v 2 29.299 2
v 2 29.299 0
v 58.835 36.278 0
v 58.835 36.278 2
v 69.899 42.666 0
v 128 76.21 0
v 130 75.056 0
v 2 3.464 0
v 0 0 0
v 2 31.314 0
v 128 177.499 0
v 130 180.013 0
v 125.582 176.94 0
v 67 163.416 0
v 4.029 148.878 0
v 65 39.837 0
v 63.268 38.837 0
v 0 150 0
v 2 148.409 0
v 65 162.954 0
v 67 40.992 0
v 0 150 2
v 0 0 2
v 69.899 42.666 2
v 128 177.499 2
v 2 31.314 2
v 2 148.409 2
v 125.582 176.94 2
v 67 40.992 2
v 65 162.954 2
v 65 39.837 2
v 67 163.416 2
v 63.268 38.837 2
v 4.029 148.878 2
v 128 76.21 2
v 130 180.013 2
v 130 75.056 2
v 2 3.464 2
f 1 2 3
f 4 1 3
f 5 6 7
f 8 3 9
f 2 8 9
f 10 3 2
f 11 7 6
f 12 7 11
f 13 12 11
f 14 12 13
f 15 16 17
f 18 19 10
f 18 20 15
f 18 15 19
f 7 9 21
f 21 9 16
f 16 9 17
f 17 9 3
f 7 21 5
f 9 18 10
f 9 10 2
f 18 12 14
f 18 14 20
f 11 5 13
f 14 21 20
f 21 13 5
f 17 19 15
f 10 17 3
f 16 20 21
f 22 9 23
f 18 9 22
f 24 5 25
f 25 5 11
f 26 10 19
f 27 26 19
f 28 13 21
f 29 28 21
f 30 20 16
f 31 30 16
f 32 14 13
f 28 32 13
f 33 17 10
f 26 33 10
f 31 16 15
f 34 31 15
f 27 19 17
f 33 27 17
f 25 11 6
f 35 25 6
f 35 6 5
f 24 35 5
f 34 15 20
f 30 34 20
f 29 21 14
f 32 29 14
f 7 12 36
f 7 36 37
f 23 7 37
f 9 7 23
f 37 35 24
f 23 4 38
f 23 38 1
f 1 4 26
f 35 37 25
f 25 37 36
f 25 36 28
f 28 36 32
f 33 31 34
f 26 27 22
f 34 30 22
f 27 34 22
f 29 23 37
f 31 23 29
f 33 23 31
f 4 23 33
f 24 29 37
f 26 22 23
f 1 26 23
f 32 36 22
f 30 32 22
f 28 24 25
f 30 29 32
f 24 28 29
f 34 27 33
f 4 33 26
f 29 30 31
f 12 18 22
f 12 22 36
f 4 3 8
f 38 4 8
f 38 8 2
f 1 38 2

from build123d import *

# Parameters (mm, degrees)
EXTRUDE_1_DEPTH = 2


with BuildPart() as part:
    # ｽｹｯﾁ1 → ﾎﾞｽ - 押し出し1 (new body)
    with BuildSketch(Plane.XY):
        Polygon((130, 75.055534995), (0, 0), (0, 150), (130, 180.012864846), align=None)
        Polygon((128, 76.210235533), (2, 3.464101615), (2, 148.409128167), (128, 177.498520248), align=None, mode=Mode.SUBTRACT)
        Polygon((67, 163.41556059), (65, 162.953824208), (65, 39.837168574), (67, 40.991869112), align=None)
        Polygon((4.029439999, 148.877661308), (2, 148.409128167), (63.267785356, 38.837073983), (65, 39.837168574), align=None)
        Polygon((125.581629022, 176.940195315), (67, 40.991869112), (69.899019864, 42.665619011), (128, 177.498520248), align=None)
        Polygon((63.267785356, 38.837073983), (2, 31.314335861), (2, 29.29931621), (58.834939644, 36.277769318), align=None)
    extrude(amount=EXTRUDE_1_DEPTH)


solid = part.part
